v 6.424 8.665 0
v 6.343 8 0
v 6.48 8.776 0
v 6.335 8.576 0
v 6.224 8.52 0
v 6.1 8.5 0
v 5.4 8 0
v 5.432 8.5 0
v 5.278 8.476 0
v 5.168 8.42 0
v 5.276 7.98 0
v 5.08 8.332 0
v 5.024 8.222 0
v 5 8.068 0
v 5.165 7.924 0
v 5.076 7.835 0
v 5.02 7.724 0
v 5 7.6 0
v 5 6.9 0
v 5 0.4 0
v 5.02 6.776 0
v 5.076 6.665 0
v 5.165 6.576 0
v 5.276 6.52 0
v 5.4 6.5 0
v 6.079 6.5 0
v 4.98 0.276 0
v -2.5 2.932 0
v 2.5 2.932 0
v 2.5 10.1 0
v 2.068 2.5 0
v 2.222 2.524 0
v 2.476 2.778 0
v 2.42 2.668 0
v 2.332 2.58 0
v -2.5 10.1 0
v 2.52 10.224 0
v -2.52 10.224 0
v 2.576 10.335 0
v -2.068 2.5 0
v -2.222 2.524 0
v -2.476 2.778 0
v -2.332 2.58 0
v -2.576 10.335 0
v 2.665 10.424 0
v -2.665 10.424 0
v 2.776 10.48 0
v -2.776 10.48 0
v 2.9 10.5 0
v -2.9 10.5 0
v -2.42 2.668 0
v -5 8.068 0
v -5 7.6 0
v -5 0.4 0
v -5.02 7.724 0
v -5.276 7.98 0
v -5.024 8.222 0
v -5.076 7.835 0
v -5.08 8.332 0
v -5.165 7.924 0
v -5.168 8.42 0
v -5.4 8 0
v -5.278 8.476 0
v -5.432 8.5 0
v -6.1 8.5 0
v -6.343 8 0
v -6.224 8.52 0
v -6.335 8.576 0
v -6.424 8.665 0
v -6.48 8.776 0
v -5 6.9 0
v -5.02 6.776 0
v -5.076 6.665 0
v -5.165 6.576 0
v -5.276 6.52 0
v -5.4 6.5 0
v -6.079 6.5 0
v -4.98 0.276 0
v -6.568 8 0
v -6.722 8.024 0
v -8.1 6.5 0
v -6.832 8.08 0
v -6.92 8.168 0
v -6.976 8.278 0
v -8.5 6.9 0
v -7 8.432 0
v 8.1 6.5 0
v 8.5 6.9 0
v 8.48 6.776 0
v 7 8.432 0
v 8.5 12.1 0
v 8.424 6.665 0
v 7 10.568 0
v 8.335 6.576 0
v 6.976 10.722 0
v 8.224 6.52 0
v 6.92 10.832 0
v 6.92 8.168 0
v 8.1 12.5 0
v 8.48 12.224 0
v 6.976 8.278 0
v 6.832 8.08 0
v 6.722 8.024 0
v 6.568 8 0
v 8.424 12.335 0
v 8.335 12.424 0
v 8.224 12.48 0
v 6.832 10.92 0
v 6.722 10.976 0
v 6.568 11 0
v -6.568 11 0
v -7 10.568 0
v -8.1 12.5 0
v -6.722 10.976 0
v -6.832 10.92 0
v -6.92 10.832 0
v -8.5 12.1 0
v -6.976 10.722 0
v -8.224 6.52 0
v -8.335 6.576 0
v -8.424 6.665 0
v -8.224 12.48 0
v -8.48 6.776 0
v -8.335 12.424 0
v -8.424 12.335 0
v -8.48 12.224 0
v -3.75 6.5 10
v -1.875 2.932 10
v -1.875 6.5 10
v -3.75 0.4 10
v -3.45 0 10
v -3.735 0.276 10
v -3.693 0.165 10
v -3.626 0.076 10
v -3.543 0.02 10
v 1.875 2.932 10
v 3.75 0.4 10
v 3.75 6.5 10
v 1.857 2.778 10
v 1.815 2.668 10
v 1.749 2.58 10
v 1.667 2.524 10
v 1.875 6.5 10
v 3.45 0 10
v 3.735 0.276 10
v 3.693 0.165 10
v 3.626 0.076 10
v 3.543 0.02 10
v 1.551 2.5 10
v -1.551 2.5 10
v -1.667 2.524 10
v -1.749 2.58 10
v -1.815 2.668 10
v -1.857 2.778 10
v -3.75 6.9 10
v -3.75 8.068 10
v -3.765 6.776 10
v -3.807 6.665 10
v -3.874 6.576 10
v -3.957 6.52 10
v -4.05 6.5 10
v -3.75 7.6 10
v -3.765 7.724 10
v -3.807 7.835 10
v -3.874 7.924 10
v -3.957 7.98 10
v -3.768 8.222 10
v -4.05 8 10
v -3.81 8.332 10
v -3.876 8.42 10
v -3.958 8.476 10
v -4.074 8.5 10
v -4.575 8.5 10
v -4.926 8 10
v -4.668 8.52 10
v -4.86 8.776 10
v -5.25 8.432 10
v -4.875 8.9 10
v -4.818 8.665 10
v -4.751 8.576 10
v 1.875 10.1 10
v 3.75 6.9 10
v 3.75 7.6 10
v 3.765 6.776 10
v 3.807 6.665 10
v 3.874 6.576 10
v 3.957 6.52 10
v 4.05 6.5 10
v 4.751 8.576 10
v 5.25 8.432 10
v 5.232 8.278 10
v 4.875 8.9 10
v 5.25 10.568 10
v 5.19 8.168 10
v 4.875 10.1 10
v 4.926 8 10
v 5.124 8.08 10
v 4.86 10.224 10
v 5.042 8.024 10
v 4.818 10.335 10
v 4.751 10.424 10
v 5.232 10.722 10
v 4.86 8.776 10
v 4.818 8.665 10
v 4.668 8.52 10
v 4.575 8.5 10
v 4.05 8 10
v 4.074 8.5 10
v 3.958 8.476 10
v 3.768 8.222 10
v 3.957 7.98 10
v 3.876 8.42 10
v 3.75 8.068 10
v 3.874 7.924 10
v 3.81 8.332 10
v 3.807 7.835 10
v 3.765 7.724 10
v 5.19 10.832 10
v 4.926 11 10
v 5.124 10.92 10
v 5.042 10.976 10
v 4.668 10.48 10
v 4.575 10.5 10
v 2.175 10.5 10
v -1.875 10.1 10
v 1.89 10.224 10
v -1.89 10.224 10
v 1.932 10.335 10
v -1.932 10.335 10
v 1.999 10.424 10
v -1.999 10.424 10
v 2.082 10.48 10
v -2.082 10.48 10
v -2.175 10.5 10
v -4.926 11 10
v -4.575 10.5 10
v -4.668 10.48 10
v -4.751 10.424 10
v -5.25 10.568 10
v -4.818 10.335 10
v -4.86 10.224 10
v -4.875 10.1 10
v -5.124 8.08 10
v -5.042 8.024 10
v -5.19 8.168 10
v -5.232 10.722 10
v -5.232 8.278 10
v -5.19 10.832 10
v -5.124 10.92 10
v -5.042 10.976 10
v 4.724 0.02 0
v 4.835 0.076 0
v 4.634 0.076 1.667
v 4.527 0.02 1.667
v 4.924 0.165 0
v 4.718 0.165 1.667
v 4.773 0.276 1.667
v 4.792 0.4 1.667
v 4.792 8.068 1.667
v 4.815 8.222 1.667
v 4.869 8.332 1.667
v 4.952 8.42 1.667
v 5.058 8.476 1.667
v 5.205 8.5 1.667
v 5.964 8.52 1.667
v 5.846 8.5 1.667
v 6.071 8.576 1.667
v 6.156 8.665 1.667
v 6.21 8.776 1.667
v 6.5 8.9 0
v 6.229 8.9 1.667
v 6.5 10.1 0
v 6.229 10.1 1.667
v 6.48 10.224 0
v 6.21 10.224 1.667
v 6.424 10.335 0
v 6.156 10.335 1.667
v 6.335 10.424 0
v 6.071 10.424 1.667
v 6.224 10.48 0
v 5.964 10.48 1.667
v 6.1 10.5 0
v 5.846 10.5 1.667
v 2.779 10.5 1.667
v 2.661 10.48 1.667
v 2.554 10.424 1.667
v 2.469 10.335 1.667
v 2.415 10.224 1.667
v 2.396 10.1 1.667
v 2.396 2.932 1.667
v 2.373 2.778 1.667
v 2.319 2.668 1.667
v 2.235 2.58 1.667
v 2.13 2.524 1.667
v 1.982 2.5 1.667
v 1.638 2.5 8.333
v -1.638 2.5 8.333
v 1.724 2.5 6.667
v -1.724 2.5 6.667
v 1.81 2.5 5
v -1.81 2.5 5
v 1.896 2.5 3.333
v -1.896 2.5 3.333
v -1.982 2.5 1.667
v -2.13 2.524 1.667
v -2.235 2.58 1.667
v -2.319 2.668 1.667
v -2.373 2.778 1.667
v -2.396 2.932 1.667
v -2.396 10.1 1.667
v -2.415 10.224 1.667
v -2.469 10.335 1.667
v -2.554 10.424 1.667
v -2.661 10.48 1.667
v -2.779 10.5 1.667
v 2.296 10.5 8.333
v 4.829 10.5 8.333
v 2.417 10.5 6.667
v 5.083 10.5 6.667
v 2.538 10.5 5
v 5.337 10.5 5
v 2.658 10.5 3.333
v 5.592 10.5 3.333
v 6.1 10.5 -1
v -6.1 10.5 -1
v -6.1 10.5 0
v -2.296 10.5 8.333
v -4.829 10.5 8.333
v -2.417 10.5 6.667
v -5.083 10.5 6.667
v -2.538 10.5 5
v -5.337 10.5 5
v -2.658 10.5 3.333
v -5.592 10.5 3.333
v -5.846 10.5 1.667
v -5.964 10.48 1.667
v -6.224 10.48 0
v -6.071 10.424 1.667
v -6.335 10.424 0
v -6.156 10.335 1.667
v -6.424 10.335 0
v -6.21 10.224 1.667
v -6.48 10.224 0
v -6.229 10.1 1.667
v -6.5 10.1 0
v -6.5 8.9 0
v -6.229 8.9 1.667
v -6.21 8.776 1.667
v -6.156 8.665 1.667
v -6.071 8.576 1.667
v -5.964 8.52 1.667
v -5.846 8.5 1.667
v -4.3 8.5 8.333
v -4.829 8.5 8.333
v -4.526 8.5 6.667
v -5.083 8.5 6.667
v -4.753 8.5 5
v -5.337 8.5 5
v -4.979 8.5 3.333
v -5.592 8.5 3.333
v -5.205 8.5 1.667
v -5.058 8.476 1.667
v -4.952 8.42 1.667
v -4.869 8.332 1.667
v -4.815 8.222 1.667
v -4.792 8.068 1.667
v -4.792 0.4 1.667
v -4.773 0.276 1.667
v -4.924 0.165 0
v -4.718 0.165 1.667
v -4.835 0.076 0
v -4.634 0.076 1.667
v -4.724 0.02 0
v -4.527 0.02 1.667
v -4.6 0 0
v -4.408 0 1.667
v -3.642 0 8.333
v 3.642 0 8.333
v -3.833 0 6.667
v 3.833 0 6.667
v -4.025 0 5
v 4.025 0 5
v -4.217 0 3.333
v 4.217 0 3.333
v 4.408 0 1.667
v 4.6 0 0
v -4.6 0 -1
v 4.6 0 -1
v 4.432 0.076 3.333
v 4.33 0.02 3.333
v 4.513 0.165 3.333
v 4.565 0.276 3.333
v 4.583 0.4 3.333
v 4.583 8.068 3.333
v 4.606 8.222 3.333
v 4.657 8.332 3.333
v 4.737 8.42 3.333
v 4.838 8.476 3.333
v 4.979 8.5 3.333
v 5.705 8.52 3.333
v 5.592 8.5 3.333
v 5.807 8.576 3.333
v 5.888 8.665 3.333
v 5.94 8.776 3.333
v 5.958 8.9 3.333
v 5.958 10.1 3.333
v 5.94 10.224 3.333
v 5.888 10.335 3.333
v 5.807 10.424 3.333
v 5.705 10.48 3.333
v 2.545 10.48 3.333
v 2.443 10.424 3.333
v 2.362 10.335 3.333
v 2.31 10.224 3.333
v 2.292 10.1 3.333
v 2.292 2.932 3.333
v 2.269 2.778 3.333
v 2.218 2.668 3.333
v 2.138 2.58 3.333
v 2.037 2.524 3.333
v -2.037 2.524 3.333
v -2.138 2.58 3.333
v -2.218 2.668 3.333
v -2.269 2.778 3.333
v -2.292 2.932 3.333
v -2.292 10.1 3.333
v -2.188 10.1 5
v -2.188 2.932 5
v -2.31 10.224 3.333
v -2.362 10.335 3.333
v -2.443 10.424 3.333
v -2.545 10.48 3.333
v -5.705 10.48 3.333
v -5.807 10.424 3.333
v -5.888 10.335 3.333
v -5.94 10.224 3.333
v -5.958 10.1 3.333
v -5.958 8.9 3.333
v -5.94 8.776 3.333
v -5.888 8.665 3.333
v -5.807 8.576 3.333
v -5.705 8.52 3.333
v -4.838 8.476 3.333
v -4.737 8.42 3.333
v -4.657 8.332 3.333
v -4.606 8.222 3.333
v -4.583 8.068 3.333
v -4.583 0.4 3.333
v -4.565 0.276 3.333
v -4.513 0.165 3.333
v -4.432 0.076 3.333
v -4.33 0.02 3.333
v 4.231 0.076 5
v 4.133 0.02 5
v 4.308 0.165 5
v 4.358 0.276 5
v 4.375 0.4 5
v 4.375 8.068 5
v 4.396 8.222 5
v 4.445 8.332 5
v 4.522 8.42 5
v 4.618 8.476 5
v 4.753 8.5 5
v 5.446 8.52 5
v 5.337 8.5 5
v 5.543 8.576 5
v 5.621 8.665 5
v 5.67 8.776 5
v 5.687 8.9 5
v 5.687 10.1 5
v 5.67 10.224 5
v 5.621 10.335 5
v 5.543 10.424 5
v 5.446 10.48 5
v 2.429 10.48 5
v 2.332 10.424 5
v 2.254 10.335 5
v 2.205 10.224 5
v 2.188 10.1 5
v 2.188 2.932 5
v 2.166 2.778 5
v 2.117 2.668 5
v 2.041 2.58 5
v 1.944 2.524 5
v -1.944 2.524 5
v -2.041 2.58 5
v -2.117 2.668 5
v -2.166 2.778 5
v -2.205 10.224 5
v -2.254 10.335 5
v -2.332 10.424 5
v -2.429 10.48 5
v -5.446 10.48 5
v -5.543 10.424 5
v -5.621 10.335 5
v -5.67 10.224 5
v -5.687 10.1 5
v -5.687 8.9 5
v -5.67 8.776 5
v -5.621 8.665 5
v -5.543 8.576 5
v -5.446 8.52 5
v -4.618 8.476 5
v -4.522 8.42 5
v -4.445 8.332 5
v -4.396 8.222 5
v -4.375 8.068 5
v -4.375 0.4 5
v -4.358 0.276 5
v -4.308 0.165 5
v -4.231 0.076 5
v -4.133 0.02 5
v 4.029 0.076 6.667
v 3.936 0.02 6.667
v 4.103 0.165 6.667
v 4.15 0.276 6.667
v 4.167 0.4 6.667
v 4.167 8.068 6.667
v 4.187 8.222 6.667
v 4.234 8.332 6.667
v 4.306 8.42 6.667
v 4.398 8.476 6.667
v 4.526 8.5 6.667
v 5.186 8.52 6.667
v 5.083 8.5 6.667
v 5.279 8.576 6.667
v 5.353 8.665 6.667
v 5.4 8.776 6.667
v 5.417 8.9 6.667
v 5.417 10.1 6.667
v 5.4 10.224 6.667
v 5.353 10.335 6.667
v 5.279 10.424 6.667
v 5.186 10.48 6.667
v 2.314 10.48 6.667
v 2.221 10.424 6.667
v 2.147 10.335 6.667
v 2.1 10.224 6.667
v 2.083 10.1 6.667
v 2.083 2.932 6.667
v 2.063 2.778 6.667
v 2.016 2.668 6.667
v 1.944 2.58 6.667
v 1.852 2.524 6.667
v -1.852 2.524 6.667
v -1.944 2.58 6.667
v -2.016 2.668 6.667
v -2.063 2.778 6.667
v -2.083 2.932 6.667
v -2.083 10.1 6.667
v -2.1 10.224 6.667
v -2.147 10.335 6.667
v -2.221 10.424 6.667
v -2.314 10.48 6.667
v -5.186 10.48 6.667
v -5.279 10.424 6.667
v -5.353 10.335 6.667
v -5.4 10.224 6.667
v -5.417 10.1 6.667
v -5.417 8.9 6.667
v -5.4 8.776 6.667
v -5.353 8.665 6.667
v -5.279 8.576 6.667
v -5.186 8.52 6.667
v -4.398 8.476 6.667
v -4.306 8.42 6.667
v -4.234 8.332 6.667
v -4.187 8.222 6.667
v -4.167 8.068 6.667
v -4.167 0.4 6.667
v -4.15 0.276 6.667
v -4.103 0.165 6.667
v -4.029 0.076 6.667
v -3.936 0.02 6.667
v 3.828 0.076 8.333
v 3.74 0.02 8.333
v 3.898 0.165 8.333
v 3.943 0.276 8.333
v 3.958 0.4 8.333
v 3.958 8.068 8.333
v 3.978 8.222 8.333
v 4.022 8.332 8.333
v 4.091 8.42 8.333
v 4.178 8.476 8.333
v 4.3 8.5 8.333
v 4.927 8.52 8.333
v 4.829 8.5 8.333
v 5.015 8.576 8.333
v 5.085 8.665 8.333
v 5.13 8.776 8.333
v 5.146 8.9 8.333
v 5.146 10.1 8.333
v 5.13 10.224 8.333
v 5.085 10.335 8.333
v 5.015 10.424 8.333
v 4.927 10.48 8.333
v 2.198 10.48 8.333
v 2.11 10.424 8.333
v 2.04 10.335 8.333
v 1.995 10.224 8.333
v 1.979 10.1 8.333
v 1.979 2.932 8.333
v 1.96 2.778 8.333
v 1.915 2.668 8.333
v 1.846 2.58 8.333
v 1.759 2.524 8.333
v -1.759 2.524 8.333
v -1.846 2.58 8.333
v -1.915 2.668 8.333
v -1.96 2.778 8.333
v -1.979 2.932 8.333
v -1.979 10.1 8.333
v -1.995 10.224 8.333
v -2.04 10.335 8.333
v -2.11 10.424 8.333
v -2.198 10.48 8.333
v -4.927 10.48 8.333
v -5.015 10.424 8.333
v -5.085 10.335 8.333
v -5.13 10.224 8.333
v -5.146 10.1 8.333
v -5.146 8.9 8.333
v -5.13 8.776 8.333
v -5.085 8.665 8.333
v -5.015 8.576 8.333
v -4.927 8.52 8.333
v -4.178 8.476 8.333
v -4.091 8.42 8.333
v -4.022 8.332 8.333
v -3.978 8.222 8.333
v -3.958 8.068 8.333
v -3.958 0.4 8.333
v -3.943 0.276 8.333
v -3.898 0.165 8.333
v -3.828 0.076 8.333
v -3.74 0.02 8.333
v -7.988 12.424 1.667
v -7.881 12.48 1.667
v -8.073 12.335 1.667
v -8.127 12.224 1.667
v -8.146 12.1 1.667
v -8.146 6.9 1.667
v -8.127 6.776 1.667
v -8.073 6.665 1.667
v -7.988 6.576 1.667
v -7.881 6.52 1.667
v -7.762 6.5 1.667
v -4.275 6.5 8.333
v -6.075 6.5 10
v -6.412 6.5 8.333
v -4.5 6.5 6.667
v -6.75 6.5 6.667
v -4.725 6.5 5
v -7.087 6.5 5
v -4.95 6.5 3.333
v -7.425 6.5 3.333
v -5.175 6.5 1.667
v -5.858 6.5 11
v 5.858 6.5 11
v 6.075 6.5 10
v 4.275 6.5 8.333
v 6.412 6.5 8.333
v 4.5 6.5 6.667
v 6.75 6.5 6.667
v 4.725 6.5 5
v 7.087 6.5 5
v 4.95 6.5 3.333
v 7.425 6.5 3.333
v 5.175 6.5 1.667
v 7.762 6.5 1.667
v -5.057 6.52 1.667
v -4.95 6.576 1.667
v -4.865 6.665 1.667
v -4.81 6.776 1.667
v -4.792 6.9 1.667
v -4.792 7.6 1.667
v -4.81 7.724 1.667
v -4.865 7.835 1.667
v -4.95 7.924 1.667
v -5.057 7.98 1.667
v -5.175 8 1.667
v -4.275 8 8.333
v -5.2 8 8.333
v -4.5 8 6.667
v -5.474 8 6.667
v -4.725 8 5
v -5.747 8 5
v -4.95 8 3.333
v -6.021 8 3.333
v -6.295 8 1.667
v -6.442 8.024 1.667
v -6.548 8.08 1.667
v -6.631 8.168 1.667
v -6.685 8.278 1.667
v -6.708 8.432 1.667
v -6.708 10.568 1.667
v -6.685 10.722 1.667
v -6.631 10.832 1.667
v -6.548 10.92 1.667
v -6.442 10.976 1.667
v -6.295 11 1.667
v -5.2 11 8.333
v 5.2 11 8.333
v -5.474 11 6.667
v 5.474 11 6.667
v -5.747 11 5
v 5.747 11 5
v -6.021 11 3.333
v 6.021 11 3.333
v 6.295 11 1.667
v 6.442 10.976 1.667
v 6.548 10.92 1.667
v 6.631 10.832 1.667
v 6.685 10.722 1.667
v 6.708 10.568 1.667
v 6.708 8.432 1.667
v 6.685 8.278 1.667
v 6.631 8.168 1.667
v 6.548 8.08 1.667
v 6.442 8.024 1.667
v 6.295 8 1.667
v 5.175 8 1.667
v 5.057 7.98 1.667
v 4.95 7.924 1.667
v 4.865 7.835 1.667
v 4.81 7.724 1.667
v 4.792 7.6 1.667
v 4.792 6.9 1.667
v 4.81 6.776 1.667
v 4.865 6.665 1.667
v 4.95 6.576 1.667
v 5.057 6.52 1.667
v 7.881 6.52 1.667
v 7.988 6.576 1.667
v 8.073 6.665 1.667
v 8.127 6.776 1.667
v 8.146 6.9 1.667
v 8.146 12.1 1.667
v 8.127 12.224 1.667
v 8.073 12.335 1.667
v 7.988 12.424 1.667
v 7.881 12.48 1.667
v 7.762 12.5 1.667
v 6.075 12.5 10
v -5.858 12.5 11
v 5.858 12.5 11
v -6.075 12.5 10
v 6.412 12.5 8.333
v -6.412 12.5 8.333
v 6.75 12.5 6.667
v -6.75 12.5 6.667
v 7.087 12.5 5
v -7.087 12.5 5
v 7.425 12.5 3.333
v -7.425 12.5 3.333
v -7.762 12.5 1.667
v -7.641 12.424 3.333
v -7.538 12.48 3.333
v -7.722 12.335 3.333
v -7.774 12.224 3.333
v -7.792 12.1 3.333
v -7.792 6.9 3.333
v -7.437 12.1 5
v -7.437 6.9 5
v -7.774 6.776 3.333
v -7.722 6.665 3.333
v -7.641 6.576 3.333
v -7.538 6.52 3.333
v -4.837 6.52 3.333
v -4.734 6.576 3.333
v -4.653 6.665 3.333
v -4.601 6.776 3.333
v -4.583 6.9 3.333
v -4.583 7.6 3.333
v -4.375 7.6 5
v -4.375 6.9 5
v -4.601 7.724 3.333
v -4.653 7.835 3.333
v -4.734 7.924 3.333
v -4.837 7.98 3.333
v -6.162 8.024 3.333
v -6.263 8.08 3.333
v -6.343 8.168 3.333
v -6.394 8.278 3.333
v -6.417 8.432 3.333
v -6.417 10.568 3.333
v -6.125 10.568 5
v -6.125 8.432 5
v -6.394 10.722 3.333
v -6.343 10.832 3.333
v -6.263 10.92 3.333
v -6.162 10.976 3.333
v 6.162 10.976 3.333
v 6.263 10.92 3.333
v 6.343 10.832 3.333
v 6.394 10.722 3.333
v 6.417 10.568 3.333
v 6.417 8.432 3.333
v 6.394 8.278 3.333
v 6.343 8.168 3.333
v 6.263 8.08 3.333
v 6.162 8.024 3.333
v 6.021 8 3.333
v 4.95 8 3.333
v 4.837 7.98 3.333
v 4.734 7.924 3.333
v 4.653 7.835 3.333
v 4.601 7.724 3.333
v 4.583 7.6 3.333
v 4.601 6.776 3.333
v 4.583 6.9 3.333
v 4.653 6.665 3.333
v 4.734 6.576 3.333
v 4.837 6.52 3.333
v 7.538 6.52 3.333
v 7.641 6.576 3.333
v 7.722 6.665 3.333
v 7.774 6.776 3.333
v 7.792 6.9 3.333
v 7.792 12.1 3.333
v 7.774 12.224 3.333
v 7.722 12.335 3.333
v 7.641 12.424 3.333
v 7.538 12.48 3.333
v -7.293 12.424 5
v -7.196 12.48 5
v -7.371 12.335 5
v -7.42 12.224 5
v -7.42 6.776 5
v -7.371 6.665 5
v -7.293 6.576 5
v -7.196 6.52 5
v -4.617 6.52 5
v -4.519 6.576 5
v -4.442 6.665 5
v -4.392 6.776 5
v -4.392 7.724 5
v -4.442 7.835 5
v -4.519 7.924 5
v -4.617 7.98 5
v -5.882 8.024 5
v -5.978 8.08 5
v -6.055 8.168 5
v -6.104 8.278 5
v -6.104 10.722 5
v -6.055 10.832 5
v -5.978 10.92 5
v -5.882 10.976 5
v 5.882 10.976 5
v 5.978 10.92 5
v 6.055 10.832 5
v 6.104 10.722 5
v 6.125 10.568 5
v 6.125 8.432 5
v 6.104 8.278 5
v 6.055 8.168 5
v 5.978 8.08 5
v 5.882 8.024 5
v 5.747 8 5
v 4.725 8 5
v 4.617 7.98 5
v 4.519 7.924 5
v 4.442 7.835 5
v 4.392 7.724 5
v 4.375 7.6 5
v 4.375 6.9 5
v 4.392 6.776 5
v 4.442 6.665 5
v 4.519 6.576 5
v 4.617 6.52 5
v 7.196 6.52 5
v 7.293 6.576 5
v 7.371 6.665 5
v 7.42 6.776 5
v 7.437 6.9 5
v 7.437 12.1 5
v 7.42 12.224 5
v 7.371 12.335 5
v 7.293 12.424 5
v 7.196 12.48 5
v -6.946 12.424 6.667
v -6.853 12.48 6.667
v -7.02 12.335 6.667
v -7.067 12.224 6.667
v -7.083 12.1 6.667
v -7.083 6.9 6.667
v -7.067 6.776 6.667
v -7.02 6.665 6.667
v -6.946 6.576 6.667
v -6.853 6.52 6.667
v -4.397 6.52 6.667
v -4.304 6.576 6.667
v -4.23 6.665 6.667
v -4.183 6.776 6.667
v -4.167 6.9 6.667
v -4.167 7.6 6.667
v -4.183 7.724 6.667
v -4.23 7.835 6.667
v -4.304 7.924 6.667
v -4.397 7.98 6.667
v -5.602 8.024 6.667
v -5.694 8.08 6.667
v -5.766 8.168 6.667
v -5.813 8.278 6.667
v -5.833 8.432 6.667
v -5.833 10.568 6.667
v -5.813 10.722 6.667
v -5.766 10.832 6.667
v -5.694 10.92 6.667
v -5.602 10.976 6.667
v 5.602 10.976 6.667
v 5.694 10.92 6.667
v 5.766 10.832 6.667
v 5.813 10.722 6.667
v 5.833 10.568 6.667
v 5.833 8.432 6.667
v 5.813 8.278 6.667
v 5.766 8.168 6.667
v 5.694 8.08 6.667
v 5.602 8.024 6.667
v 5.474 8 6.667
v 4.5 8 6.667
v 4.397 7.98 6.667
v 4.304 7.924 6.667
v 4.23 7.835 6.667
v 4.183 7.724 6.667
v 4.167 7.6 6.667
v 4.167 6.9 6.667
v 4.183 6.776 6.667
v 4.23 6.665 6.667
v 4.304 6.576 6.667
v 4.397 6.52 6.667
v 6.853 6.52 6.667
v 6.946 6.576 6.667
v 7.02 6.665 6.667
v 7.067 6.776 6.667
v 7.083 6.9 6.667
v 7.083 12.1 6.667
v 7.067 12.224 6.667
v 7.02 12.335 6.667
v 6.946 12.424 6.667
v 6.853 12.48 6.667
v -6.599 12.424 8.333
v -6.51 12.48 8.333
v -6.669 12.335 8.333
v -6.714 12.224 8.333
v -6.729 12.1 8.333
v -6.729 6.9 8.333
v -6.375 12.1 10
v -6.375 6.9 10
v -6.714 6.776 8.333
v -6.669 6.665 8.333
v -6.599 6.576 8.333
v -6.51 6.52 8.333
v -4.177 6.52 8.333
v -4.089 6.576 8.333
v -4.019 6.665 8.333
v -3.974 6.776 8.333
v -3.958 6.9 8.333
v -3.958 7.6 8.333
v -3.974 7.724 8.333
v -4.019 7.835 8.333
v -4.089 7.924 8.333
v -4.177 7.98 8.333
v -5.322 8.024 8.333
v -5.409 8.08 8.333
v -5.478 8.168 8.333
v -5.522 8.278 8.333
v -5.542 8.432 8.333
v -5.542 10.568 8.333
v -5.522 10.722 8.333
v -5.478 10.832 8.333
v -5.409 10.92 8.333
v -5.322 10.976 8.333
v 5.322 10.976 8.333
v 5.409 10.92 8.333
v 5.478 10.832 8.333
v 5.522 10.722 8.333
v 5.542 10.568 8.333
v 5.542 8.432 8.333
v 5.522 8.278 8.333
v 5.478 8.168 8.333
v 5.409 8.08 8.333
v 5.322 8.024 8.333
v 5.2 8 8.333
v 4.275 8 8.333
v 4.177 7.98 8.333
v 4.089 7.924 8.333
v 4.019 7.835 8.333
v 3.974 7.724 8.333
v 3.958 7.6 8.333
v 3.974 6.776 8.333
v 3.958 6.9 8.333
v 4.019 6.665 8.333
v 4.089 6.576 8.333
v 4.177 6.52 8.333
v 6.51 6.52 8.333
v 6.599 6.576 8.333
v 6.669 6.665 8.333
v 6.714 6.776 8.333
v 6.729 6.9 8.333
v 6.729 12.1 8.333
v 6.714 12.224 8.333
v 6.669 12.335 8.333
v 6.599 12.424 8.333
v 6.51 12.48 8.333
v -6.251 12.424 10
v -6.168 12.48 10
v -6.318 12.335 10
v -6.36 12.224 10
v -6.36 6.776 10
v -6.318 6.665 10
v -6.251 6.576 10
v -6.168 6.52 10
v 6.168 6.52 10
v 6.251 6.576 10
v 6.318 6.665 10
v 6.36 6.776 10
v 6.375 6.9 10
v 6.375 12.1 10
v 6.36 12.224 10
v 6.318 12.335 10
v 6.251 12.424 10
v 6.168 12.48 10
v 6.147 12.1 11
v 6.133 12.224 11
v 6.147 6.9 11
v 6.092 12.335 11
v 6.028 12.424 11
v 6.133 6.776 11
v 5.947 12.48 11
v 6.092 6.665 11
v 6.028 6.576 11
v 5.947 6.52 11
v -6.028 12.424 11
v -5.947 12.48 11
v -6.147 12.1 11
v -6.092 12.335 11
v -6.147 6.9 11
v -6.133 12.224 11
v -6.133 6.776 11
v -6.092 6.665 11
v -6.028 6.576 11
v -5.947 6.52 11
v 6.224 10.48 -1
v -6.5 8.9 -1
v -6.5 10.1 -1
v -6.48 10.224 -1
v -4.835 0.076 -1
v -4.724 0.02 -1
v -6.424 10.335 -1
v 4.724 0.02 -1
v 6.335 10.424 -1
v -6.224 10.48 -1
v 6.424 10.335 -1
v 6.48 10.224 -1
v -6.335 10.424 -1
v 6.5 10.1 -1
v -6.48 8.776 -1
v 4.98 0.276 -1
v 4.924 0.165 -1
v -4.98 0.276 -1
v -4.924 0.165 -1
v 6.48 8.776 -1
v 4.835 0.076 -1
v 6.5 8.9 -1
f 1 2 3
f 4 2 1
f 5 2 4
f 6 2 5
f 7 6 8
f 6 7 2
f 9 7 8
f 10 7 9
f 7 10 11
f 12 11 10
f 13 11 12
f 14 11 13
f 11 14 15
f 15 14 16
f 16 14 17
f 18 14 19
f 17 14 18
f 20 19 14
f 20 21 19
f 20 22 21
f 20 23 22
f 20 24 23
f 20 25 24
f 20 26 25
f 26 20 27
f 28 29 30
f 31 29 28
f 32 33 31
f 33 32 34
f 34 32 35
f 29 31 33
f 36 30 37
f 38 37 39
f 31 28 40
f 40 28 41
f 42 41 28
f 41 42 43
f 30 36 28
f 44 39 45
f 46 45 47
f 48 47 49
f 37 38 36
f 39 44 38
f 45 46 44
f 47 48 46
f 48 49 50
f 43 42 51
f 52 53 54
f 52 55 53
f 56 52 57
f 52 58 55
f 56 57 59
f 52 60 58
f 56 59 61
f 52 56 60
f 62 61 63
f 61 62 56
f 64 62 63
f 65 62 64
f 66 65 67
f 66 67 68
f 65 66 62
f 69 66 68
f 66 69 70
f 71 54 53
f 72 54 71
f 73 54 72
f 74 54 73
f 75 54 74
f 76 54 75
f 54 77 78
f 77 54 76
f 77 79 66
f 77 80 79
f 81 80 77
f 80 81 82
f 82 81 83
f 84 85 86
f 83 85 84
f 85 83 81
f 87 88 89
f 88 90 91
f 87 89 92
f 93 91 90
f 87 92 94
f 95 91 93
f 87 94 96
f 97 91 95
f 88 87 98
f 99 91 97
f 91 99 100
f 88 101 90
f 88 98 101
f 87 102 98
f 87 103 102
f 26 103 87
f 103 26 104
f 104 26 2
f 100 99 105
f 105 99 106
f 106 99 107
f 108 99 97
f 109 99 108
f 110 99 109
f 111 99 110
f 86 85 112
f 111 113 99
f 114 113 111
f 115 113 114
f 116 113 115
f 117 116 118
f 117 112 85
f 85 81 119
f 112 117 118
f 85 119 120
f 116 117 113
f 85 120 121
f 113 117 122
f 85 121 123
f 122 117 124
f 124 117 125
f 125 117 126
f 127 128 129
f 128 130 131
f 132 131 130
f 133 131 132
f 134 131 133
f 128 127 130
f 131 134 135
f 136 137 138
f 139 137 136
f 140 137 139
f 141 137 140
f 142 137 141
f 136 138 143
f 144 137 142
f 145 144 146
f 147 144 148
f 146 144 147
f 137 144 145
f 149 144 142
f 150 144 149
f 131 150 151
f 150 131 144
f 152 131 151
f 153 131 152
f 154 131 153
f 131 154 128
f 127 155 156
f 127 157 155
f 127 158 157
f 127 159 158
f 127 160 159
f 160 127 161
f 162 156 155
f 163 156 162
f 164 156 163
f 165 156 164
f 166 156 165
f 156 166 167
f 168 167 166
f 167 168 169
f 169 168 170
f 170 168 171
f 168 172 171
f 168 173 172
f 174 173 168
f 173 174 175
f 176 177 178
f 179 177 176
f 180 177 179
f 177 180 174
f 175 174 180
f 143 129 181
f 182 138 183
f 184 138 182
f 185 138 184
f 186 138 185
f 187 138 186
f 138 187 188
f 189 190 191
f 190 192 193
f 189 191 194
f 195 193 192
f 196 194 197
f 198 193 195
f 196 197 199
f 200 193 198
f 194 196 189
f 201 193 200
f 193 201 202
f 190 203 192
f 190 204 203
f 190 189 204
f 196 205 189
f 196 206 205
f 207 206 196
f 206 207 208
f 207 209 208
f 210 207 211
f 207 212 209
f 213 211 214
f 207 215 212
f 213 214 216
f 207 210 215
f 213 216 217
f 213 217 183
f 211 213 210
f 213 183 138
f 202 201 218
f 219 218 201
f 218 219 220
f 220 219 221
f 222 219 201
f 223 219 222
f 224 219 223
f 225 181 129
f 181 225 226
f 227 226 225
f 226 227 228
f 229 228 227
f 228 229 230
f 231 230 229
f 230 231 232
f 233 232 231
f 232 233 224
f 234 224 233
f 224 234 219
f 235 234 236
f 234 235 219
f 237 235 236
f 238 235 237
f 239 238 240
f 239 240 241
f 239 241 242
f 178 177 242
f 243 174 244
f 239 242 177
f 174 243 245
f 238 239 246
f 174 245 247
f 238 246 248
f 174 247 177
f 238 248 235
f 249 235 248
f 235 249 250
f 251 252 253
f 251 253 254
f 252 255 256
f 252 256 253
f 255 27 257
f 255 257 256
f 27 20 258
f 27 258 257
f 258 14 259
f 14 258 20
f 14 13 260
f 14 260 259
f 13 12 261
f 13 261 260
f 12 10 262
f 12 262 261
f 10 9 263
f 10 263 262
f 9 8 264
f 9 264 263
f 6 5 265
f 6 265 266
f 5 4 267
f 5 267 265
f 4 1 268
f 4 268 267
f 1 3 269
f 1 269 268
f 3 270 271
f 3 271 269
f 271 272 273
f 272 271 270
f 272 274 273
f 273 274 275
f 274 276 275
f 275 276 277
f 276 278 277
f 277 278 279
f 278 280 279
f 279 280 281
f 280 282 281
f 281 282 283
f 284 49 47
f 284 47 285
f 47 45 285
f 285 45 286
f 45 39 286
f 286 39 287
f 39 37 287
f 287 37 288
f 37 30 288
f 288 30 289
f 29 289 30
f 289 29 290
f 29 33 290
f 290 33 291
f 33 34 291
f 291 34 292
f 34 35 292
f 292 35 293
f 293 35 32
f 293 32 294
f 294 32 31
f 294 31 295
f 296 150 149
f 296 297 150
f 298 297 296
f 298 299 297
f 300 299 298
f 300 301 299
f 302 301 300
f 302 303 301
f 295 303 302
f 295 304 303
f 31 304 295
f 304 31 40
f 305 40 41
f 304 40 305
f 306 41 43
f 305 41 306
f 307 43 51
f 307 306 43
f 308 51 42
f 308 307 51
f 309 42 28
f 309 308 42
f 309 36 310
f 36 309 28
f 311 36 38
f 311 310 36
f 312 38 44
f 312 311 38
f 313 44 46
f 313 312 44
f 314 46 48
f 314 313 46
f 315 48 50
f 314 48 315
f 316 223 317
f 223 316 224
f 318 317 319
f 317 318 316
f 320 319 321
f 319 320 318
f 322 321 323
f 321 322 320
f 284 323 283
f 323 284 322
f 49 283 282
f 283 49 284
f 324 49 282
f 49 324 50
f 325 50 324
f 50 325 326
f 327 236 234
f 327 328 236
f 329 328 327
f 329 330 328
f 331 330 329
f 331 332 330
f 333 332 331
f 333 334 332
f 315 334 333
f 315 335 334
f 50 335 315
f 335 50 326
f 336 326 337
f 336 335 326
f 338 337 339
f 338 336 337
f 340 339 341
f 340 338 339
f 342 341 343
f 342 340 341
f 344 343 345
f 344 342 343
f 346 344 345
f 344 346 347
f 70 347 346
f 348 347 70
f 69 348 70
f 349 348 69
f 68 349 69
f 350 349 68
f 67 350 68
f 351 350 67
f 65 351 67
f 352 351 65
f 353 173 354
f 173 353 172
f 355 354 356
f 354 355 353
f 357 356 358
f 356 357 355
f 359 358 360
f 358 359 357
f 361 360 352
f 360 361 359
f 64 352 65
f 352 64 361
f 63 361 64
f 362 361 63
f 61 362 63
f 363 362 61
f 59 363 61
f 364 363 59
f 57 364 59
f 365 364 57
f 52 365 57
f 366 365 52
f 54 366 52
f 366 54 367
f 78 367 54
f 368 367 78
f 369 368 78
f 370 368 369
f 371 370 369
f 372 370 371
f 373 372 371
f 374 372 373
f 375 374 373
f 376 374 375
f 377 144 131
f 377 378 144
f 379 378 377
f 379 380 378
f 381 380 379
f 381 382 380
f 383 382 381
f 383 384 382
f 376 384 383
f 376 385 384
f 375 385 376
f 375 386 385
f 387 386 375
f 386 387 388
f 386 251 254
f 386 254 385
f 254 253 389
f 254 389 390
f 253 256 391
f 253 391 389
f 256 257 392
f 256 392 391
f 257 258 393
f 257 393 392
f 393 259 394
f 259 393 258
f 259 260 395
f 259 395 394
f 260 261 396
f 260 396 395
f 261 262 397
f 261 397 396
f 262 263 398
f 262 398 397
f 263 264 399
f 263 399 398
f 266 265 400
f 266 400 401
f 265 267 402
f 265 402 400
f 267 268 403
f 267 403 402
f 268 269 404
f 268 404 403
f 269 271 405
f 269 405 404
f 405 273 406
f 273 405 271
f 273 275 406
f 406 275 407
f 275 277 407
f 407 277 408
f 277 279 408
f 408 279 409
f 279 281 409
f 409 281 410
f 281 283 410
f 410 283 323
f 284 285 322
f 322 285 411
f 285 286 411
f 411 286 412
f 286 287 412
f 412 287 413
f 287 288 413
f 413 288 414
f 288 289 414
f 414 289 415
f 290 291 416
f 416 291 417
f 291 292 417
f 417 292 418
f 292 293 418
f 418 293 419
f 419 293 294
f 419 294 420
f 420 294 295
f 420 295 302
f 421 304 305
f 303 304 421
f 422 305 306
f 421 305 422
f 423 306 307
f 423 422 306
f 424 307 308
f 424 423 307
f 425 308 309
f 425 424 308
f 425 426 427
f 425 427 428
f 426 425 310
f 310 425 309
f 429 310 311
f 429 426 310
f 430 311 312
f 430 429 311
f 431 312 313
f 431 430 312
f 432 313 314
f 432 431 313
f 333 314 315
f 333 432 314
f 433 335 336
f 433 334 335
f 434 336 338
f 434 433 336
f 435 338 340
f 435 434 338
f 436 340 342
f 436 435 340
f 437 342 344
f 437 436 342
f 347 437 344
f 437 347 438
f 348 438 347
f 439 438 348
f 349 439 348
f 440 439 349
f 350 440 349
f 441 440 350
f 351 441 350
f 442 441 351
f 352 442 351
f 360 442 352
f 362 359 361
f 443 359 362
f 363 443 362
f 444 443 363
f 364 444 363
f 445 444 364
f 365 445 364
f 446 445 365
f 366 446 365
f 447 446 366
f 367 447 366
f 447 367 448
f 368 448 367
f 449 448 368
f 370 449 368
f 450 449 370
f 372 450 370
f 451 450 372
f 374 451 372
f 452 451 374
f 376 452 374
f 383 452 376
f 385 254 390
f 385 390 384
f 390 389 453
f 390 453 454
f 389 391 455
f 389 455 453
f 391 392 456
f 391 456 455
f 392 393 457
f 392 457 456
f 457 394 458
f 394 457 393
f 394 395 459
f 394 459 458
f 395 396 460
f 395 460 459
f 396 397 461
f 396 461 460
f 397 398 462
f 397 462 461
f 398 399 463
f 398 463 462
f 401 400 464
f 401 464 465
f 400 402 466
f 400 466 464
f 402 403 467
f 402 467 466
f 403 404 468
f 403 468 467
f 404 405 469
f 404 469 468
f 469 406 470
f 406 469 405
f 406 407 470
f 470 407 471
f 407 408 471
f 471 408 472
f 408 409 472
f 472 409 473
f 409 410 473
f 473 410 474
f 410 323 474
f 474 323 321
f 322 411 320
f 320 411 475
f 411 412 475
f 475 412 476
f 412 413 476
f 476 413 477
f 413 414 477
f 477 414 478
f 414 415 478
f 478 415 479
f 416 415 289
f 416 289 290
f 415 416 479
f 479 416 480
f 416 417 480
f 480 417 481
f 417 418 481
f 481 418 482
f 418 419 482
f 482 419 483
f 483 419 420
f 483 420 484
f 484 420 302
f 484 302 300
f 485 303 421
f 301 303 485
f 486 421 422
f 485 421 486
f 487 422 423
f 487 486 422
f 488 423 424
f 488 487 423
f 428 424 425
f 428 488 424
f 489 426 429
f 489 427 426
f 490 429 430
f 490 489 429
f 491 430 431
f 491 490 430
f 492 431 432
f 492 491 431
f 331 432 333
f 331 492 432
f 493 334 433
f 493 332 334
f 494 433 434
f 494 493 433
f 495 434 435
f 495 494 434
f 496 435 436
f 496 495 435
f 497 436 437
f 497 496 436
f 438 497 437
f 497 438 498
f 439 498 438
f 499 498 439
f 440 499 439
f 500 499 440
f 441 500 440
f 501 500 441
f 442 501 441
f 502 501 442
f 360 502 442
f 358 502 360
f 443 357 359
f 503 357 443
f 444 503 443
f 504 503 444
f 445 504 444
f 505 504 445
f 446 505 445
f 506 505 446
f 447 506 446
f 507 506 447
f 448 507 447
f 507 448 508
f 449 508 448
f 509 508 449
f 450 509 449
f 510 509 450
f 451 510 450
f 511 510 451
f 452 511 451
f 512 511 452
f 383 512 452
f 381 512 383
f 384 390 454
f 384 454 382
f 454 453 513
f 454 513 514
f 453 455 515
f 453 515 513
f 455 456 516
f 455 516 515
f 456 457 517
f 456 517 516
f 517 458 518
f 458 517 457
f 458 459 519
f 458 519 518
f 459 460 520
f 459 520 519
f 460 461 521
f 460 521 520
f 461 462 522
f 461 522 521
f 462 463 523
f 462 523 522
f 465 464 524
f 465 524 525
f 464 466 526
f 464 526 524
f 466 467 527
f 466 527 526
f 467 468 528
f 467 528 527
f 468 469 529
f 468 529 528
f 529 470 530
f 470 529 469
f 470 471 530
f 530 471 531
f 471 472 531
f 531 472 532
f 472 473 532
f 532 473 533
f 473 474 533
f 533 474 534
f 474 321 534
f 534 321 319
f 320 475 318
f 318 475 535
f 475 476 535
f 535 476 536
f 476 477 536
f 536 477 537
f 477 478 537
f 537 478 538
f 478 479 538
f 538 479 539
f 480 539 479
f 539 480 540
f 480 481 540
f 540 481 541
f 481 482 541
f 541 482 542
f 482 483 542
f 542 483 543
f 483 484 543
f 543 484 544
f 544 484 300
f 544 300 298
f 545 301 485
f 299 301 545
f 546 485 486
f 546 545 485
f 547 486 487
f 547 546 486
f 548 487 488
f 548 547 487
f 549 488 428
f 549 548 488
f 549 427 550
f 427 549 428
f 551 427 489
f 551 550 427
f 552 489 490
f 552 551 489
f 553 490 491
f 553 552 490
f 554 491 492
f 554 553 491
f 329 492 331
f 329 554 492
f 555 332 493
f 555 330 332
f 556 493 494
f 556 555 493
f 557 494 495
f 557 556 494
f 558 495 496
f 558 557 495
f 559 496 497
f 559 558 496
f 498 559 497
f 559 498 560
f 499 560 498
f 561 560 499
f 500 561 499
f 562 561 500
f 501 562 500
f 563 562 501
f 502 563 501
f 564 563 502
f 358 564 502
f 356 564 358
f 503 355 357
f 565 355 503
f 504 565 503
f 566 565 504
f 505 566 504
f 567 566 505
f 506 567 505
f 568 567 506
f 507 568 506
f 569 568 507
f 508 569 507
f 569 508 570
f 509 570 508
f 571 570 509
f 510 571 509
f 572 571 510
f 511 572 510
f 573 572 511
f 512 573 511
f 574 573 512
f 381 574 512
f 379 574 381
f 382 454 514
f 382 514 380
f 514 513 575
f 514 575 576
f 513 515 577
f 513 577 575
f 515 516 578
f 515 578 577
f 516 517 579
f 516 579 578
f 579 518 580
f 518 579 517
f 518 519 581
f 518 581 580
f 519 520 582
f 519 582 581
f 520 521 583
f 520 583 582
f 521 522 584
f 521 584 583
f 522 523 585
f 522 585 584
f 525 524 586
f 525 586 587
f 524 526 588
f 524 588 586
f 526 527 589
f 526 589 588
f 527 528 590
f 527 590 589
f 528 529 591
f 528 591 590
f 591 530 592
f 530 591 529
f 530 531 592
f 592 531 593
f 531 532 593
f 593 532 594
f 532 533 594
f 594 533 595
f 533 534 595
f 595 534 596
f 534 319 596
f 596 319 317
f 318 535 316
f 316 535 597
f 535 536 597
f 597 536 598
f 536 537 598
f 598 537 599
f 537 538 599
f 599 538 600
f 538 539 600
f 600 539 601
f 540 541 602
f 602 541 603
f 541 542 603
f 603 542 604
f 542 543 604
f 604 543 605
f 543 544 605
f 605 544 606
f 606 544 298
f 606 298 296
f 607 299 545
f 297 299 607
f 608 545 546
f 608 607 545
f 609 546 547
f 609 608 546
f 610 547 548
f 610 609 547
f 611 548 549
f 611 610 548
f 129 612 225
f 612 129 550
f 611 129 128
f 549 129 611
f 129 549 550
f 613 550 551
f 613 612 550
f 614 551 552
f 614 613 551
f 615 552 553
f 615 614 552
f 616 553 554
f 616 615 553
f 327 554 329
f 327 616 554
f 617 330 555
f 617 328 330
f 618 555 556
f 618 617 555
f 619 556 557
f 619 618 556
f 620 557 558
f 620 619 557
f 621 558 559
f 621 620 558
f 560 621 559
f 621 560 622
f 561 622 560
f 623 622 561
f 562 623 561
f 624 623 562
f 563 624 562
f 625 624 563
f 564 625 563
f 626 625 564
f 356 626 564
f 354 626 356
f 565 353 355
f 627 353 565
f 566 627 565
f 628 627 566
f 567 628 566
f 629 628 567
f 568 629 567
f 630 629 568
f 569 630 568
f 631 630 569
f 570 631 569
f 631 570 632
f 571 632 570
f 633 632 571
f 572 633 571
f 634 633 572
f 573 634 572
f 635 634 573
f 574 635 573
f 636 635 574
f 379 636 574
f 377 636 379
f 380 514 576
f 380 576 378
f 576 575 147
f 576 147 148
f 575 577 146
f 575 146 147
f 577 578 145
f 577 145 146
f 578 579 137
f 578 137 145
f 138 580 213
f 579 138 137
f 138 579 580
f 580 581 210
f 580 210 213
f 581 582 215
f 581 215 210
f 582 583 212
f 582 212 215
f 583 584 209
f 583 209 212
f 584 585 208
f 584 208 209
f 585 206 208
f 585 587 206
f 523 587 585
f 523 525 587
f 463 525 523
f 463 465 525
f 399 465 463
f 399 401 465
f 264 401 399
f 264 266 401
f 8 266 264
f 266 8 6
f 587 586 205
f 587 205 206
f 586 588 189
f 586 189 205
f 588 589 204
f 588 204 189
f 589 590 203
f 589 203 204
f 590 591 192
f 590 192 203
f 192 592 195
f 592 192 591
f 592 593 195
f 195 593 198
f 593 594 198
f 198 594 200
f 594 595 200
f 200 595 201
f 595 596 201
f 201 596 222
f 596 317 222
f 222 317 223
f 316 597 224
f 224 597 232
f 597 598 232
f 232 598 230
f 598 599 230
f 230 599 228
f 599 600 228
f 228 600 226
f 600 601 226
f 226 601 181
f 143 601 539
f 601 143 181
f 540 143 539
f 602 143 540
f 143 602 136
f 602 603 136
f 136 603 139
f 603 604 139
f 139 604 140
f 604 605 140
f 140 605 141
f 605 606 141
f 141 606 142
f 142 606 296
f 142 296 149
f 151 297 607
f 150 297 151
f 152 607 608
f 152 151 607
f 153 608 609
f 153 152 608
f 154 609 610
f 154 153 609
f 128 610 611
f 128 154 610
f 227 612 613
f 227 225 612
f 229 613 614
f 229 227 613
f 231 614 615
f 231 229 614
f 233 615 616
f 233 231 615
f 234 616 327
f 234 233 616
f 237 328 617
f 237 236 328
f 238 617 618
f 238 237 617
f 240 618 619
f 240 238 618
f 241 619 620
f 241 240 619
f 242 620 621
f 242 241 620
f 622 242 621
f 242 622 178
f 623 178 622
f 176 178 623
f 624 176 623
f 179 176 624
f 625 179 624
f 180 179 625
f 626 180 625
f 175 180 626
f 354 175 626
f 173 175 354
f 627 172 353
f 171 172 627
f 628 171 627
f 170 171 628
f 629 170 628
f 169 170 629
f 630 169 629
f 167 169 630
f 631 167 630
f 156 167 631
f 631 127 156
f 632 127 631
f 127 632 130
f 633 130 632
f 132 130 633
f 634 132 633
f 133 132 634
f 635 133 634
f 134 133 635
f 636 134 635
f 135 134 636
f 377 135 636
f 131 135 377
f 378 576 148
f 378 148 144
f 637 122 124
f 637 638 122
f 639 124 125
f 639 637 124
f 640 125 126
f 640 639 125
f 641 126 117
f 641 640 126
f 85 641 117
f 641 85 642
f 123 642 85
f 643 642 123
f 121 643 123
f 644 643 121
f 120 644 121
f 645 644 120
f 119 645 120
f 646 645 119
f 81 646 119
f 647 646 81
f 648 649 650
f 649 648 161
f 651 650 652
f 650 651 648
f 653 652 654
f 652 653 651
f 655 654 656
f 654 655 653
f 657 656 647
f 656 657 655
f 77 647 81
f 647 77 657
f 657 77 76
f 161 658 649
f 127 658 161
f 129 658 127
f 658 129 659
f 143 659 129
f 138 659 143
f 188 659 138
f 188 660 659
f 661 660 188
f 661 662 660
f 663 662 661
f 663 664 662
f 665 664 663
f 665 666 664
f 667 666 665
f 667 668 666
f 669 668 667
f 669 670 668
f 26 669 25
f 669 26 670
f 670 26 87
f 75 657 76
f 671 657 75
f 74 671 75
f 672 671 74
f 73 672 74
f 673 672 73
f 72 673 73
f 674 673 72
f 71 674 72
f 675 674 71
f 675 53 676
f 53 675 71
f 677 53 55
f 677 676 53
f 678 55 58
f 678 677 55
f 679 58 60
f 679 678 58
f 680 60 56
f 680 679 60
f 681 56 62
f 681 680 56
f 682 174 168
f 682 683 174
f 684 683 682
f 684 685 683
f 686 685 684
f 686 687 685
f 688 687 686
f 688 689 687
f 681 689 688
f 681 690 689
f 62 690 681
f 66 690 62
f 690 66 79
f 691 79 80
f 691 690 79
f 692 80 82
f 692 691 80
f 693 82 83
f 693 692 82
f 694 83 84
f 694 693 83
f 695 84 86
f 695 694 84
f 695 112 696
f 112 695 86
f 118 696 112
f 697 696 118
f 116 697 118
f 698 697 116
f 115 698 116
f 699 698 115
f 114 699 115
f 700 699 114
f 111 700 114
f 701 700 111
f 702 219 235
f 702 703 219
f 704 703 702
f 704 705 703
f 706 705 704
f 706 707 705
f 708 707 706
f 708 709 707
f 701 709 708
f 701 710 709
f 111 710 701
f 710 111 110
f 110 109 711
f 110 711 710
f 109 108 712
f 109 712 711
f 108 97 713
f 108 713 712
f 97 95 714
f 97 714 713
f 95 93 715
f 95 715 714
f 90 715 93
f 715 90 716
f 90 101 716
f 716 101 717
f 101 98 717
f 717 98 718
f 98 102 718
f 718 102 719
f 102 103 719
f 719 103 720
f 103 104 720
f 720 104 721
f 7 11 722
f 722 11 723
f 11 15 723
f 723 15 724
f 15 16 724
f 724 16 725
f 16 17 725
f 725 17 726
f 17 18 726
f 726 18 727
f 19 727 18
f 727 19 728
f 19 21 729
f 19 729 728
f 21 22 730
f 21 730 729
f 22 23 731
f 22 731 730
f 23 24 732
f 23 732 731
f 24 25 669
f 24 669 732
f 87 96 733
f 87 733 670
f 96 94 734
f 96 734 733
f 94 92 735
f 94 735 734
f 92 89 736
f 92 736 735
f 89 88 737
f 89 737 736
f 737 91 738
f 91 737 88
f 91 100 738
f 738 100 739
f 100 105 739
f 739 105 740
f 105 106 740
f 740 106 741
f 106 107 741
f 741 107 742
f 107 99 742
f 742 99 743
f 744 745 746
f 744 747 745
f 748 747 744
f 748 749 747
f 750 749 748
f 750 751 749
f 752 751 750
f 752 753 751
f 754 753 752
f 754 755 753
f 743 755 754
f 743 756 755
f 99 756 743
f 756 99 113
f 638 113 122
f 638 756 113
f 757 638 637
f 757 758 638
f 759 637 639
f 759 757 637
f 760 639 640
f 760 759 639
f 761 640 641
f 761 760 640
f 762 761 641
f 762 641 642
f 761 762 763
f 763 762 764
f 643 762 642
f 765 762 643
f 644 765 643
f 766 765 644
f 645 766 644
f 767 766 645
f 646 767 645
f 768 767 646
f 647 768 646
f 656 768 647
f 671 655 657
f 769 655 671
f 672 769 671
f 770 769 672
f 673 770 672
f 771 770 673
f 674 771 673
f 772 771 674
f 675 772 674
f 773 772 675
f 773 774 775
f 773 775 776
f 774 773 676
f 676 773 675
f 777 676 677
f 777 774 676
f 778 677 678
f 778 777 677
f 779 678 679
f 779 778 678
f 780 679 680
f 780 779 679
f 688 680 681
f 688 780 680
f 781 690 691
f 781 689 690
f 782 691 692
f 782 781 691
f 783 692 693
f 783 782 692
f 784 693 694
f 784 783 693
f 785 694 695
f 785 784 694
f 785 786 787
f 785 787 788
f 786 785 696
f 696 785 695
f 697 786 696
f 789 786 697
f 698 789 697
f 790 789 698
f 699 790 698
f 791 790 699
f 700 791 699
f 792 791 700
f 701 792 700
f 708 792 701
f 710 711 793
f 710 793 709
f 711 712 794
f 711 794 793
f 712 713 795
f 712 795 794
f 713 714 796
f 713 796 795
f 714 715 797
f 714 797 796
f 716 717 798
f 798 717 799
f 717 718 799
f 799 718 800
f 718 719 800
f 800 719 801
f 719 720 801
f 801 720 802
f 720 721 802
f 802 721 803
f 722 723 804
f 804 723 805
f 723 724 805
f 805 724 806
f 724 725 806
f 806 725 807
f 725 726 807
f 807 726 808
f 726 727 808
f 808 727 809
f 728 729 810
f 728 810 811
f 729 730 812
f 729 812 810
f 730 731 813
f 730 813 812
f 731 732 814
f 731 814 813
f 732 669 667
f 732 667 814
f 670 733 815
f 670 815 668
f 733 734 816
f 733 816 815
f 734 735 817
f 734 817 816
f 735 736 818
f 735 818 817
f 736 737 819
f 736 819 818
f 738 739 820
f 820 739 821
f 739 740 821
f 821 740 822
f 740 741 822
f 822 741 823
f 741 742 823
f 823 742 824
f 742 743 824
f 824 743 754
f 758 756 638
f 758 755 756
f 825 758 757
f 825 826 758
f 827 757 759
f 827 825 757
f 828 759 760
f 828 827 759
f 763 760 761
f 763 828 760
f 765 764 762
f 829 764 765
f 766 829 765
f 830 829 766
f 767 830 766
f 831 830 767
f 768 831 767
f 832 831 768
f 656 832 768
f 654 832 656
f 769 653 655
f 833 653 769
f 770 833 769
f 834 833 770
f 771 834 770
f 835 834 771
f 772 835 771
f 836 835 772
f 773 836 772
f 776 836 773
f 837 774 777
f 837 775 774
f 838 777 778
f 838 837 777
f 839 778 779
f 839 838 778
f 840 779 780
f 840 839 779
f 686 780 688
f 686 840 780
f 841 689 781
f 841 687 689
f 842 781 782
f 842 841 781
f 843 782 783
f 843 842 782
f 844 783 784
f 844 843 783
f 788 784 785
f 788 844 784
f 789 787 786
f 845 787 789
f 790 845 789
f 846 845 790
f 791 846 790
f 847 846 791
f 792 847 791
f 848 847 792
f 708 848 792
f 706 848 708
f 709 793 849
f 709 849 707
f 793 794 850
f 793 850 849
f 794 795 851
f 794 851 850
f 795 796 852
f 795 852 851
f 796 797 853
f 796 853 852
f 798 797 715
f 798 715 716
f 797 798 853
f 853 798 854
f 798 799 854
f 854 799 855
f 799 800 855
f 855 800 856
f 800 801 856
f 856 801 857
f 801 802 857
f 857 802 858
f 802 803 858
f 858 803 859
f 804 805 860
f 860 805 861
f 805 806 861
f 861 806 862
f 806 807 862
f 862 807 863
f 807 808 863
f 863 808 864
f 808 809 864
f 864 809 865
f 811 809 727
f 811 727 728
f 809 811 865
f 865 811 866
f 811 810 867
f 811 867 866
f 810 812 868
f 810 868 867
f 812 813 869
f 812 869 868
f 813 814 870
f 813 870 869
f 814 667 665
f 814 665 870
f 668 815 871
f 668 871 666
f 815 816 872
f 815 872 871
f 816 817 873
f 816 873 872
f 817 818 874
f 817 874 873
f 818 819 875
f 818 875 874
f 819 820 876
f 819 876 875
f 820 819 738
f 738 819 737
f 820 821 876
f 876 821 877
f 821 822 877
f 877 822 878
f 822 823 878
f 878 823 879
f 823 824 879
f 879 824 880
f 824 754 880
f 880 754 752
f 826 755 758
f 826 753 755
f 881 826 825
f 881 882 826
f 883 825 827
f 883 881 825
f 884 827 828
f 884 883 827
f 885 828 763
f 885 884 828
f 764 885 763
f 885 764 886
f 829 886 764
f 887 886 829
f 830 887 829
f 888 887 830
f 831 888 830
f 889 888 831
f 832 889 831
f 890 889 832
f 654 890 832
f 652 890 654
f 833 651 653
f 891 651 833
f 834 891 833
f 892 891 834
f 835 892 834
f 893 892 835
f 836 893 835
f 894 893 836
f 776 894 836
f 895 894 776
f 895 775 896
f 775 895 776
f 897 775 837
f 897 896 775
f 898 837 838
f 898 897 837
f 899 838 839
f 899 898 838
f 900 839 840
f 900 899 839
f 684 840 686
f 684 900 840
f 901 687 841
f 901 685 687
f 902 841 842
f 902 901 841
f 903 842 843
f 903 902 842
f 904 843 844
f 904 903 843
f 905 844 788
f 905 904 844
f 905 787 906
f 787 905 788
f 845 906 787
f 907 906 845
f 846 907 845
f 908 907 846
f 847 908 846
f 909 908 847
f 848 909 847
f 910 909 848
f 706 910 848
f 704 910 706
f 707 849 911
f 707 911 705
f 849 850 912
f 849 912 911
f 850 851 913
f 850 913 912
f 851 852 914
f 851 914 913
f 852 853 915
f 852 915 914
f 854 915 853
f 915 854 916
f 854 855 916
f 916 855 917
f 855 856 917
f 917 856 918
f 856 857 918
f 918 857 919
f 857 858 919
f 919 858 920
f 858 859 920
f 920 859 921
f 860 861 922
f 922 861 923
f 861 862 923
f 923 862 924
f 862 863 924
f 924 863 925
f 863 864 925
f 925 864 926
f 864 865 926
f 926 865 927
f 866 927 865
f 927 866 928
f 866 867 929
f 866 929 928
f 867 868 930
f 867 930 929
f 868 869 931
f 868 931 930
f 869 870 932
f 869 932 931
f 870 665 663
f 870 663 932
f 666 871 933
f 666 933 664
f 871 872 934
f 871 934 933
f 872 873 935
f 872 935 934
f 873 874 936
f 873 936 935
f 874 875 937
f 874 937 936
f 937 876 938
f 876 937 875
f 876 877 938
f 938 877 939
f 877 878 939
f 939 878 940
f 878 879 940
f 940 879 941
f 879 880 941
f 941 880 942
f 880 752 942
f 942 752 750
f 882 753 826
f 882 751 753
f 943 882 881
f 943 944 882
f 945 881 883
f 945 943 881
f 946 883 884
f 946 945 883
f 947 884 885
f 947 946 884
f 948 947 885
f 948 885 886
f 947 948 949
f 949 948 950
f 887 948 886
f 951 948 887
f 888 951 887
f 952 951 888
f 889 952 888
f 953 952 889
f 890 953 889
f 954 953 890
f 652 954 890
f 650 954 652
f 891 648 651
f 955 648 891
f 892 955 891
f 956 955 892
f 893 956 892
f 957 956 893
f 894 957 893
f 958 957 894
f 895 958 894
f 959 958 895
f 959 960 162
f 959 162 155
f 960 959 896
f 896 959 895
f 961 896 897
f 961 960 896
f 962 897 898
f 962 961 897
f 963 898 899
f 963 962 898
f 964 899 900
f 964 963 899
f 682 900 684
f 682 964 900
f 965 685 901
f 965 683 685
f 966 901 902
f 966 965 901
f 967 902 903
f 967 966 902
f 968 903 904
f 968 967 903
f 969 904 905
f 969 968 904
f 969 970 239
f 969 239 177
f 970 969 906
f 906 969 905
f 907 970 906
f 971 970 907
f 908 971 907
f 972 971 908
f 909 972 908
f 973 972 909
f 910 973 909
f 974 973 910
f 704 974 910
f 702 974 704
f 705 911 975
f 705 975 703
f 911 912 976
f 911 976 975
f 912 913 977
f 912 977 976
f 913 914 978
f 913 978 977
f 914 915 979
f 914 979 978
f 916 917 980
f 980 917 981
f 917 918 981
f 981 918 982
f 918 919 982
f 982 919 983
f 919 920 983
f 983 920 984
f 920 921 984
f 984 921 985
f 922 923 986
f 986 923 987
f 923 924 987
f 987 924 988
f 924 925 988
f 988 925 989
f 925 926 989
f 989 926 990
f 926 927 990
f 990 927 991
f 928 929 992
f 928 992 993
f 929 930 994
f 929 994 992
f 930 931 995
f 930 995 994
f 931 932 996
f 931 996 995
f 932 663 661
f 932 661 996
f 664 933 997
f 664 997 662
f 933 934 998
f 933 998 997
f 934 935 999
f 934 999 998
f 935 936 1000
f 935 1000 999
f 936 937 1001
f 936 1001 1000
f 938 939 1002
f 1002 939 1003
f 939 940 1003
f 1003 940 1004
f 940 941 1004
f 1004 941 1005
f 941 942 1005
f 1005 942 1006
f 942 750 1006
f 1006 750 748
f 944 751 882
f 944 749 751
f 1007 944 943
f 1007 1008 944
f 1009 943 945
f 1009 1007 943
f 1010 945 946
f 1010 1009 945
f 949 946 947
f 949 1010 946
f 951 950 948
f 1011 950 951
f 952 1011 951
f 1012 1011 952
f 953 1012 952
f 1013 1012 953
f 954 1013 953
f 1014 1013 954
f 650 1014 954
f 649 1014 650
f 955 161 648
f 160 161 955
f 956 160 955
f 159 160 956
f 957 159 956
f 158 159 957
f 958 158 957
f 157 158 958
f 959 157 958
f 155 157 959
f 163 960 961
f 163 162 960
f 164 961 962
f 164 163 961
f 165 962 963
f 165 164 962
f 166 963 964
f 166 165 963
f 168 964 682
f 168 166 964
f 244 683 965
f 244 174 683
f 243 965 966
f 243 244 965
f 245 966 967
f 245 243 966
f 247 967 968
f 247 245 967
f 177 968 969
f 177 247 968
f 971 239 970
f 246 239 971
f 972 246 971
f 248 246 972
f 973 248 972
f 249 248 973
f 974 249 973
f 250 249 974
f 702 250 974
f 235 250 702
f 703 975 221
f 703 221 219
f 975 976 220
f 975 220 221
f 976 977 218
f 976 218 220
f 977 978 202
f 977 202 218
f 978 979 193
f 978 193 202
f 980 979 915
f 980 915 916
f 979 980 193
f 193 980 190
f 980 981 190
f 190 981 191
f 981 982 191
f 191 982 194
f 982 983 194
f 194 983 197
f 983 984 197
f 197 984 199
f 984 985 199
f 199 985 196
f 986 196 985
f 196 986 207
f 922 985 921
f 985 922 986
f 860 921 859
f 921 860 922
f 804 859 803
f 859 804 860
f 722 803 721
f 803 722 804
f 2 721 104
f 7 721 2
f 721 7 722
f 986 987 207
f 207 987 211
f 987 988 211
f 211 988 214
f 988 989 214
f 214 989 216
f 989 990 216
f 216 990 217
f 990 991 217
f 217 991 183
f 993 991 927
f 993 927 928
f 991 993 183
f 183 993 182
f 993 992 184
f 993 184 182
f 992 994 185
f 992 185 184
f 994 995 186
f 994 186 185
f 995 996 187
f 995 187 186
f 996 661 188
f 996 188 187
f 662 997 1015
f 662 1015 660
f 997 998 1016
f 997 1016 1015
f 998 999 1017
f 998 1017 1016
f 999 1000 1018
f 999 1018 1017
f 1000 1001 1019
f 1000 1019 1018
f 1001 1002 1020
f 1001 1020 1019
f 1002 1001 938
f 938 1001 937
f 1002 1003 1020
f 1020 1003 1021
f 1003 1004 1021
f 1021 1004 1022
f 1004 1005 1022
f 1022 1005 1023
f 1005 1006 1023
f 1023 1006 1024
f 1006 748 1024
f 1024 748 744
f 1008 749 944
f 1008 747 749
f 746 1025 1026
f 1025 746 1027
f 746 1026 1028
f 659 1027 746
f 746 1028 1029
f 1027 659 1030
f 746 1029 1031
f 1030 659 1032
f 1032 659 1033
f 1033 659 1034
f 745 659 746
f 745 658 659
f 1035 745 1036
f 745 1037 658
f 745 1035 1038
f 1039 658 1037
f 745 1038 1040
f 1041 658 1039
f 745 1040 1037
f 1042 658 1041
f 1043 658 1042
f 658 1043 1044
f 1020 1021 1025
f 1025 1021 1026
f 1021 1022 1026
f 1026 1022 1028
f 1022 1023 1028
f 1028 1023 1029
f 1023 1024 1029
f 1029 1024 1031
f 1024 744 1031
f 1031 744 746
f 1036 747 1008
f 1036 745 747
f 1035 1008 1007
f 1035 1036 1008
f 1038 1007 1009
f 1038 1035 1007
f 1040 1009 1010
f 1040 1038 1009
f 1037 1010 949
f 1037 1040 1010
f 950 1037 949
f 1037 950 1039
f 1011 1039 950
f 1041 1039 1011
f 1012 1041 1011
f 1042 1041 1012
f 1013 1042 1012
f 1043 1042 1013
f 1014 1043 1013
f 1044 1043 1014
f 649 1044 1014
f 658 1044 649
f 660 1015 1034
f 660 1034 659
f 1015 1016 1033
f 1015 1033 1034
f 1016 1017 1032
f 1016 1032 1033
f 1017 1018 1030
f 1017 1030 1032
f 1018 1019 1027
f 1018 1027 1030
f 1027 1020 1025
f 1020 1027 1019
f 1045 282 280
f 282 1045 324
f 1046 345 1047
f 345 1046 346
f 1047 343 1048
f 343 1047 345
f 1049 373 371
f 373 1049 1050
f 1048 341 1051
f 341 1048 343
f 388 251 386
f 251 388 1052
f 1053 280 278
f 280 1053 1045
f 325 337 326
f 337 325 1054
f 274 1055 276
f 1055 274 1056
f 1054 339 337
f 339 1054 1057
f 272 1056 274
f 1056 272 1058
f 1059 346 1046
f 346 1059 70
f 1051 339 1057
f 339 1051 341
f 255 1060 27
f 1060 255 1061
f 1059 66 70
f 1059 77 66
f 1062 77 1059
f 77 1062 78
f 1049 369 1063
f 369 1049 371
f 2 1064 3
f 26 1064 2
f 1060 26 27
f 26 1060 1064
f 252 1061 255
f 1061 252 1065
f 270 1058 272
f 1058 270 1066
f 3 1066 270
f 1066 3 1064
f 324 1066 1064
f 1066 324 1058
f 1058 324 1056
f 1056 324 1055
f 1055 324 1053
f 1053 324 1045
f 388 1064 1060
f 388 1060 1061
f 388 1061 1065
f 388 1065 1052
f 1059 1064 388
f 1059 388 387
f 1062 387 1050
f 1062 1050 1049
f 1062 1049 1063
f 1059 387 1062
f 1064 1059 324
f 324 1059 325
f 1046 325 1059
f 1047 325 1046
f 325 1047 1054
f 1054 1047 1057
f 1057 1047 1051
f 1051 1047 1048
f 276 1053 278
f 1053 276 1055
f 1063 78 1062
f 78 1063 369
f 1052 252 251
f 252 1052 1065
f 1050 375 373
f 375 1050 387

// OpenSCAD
linear_extrude 
(10,scale=[0.75,1]) 
offset( 0.4,$fn=20)offset(-0.8,$fn=20)offset( 0.4,$fn=20) difference(){
union(){
translate([0,5])square(10,true);
translate([0,9.5])square([13,2],true);}
translate([0,7])square([5,9],true);}

color("Red")translate([0,14.5])rotate([0,0,180])
linear_extrude 
(10,scale=[0.75,1 ]) 
offset( 0.4,$fn=20)offset(-0.8,$fn=20)offset( 0.4,$fn=20) difference(){
 
translate([0,5])square([17,6],true);
 
translate([0,5])square([14,3],true);
translate([0,7])square([10,5],true);
}

color("Red")translate([0,14.5,10])rotate([0,0,180])
scale ([0.75,1 ])linear_extrude 
(1,scale=[1-(0.25/7),1 ]) hull(){
offset( 0.4,$fn=20)offset(-0.8,$fn=20)offset( 0.4,$fn=20) difference(){
 
translate([0,5])square([17,6],true);
 
translate([0,5])square([14,3],true);
translate([0,7])square([10,5],true);
}}


translate([0,0,-1] )linear_extrude 
(1 ) 
hull(){offset( 0.4,$fn=20)offset(-0.8,$fn=20)offset( 0.4,$fn=20) difference(){
union(){
translate([0,5])square(10,true);
translate([0,9.5])square([13,2],true);}
translate([0,7])square([5,9],true);}}

module plate(){}
module finn(){}
module stop(){}
module snap(){}
